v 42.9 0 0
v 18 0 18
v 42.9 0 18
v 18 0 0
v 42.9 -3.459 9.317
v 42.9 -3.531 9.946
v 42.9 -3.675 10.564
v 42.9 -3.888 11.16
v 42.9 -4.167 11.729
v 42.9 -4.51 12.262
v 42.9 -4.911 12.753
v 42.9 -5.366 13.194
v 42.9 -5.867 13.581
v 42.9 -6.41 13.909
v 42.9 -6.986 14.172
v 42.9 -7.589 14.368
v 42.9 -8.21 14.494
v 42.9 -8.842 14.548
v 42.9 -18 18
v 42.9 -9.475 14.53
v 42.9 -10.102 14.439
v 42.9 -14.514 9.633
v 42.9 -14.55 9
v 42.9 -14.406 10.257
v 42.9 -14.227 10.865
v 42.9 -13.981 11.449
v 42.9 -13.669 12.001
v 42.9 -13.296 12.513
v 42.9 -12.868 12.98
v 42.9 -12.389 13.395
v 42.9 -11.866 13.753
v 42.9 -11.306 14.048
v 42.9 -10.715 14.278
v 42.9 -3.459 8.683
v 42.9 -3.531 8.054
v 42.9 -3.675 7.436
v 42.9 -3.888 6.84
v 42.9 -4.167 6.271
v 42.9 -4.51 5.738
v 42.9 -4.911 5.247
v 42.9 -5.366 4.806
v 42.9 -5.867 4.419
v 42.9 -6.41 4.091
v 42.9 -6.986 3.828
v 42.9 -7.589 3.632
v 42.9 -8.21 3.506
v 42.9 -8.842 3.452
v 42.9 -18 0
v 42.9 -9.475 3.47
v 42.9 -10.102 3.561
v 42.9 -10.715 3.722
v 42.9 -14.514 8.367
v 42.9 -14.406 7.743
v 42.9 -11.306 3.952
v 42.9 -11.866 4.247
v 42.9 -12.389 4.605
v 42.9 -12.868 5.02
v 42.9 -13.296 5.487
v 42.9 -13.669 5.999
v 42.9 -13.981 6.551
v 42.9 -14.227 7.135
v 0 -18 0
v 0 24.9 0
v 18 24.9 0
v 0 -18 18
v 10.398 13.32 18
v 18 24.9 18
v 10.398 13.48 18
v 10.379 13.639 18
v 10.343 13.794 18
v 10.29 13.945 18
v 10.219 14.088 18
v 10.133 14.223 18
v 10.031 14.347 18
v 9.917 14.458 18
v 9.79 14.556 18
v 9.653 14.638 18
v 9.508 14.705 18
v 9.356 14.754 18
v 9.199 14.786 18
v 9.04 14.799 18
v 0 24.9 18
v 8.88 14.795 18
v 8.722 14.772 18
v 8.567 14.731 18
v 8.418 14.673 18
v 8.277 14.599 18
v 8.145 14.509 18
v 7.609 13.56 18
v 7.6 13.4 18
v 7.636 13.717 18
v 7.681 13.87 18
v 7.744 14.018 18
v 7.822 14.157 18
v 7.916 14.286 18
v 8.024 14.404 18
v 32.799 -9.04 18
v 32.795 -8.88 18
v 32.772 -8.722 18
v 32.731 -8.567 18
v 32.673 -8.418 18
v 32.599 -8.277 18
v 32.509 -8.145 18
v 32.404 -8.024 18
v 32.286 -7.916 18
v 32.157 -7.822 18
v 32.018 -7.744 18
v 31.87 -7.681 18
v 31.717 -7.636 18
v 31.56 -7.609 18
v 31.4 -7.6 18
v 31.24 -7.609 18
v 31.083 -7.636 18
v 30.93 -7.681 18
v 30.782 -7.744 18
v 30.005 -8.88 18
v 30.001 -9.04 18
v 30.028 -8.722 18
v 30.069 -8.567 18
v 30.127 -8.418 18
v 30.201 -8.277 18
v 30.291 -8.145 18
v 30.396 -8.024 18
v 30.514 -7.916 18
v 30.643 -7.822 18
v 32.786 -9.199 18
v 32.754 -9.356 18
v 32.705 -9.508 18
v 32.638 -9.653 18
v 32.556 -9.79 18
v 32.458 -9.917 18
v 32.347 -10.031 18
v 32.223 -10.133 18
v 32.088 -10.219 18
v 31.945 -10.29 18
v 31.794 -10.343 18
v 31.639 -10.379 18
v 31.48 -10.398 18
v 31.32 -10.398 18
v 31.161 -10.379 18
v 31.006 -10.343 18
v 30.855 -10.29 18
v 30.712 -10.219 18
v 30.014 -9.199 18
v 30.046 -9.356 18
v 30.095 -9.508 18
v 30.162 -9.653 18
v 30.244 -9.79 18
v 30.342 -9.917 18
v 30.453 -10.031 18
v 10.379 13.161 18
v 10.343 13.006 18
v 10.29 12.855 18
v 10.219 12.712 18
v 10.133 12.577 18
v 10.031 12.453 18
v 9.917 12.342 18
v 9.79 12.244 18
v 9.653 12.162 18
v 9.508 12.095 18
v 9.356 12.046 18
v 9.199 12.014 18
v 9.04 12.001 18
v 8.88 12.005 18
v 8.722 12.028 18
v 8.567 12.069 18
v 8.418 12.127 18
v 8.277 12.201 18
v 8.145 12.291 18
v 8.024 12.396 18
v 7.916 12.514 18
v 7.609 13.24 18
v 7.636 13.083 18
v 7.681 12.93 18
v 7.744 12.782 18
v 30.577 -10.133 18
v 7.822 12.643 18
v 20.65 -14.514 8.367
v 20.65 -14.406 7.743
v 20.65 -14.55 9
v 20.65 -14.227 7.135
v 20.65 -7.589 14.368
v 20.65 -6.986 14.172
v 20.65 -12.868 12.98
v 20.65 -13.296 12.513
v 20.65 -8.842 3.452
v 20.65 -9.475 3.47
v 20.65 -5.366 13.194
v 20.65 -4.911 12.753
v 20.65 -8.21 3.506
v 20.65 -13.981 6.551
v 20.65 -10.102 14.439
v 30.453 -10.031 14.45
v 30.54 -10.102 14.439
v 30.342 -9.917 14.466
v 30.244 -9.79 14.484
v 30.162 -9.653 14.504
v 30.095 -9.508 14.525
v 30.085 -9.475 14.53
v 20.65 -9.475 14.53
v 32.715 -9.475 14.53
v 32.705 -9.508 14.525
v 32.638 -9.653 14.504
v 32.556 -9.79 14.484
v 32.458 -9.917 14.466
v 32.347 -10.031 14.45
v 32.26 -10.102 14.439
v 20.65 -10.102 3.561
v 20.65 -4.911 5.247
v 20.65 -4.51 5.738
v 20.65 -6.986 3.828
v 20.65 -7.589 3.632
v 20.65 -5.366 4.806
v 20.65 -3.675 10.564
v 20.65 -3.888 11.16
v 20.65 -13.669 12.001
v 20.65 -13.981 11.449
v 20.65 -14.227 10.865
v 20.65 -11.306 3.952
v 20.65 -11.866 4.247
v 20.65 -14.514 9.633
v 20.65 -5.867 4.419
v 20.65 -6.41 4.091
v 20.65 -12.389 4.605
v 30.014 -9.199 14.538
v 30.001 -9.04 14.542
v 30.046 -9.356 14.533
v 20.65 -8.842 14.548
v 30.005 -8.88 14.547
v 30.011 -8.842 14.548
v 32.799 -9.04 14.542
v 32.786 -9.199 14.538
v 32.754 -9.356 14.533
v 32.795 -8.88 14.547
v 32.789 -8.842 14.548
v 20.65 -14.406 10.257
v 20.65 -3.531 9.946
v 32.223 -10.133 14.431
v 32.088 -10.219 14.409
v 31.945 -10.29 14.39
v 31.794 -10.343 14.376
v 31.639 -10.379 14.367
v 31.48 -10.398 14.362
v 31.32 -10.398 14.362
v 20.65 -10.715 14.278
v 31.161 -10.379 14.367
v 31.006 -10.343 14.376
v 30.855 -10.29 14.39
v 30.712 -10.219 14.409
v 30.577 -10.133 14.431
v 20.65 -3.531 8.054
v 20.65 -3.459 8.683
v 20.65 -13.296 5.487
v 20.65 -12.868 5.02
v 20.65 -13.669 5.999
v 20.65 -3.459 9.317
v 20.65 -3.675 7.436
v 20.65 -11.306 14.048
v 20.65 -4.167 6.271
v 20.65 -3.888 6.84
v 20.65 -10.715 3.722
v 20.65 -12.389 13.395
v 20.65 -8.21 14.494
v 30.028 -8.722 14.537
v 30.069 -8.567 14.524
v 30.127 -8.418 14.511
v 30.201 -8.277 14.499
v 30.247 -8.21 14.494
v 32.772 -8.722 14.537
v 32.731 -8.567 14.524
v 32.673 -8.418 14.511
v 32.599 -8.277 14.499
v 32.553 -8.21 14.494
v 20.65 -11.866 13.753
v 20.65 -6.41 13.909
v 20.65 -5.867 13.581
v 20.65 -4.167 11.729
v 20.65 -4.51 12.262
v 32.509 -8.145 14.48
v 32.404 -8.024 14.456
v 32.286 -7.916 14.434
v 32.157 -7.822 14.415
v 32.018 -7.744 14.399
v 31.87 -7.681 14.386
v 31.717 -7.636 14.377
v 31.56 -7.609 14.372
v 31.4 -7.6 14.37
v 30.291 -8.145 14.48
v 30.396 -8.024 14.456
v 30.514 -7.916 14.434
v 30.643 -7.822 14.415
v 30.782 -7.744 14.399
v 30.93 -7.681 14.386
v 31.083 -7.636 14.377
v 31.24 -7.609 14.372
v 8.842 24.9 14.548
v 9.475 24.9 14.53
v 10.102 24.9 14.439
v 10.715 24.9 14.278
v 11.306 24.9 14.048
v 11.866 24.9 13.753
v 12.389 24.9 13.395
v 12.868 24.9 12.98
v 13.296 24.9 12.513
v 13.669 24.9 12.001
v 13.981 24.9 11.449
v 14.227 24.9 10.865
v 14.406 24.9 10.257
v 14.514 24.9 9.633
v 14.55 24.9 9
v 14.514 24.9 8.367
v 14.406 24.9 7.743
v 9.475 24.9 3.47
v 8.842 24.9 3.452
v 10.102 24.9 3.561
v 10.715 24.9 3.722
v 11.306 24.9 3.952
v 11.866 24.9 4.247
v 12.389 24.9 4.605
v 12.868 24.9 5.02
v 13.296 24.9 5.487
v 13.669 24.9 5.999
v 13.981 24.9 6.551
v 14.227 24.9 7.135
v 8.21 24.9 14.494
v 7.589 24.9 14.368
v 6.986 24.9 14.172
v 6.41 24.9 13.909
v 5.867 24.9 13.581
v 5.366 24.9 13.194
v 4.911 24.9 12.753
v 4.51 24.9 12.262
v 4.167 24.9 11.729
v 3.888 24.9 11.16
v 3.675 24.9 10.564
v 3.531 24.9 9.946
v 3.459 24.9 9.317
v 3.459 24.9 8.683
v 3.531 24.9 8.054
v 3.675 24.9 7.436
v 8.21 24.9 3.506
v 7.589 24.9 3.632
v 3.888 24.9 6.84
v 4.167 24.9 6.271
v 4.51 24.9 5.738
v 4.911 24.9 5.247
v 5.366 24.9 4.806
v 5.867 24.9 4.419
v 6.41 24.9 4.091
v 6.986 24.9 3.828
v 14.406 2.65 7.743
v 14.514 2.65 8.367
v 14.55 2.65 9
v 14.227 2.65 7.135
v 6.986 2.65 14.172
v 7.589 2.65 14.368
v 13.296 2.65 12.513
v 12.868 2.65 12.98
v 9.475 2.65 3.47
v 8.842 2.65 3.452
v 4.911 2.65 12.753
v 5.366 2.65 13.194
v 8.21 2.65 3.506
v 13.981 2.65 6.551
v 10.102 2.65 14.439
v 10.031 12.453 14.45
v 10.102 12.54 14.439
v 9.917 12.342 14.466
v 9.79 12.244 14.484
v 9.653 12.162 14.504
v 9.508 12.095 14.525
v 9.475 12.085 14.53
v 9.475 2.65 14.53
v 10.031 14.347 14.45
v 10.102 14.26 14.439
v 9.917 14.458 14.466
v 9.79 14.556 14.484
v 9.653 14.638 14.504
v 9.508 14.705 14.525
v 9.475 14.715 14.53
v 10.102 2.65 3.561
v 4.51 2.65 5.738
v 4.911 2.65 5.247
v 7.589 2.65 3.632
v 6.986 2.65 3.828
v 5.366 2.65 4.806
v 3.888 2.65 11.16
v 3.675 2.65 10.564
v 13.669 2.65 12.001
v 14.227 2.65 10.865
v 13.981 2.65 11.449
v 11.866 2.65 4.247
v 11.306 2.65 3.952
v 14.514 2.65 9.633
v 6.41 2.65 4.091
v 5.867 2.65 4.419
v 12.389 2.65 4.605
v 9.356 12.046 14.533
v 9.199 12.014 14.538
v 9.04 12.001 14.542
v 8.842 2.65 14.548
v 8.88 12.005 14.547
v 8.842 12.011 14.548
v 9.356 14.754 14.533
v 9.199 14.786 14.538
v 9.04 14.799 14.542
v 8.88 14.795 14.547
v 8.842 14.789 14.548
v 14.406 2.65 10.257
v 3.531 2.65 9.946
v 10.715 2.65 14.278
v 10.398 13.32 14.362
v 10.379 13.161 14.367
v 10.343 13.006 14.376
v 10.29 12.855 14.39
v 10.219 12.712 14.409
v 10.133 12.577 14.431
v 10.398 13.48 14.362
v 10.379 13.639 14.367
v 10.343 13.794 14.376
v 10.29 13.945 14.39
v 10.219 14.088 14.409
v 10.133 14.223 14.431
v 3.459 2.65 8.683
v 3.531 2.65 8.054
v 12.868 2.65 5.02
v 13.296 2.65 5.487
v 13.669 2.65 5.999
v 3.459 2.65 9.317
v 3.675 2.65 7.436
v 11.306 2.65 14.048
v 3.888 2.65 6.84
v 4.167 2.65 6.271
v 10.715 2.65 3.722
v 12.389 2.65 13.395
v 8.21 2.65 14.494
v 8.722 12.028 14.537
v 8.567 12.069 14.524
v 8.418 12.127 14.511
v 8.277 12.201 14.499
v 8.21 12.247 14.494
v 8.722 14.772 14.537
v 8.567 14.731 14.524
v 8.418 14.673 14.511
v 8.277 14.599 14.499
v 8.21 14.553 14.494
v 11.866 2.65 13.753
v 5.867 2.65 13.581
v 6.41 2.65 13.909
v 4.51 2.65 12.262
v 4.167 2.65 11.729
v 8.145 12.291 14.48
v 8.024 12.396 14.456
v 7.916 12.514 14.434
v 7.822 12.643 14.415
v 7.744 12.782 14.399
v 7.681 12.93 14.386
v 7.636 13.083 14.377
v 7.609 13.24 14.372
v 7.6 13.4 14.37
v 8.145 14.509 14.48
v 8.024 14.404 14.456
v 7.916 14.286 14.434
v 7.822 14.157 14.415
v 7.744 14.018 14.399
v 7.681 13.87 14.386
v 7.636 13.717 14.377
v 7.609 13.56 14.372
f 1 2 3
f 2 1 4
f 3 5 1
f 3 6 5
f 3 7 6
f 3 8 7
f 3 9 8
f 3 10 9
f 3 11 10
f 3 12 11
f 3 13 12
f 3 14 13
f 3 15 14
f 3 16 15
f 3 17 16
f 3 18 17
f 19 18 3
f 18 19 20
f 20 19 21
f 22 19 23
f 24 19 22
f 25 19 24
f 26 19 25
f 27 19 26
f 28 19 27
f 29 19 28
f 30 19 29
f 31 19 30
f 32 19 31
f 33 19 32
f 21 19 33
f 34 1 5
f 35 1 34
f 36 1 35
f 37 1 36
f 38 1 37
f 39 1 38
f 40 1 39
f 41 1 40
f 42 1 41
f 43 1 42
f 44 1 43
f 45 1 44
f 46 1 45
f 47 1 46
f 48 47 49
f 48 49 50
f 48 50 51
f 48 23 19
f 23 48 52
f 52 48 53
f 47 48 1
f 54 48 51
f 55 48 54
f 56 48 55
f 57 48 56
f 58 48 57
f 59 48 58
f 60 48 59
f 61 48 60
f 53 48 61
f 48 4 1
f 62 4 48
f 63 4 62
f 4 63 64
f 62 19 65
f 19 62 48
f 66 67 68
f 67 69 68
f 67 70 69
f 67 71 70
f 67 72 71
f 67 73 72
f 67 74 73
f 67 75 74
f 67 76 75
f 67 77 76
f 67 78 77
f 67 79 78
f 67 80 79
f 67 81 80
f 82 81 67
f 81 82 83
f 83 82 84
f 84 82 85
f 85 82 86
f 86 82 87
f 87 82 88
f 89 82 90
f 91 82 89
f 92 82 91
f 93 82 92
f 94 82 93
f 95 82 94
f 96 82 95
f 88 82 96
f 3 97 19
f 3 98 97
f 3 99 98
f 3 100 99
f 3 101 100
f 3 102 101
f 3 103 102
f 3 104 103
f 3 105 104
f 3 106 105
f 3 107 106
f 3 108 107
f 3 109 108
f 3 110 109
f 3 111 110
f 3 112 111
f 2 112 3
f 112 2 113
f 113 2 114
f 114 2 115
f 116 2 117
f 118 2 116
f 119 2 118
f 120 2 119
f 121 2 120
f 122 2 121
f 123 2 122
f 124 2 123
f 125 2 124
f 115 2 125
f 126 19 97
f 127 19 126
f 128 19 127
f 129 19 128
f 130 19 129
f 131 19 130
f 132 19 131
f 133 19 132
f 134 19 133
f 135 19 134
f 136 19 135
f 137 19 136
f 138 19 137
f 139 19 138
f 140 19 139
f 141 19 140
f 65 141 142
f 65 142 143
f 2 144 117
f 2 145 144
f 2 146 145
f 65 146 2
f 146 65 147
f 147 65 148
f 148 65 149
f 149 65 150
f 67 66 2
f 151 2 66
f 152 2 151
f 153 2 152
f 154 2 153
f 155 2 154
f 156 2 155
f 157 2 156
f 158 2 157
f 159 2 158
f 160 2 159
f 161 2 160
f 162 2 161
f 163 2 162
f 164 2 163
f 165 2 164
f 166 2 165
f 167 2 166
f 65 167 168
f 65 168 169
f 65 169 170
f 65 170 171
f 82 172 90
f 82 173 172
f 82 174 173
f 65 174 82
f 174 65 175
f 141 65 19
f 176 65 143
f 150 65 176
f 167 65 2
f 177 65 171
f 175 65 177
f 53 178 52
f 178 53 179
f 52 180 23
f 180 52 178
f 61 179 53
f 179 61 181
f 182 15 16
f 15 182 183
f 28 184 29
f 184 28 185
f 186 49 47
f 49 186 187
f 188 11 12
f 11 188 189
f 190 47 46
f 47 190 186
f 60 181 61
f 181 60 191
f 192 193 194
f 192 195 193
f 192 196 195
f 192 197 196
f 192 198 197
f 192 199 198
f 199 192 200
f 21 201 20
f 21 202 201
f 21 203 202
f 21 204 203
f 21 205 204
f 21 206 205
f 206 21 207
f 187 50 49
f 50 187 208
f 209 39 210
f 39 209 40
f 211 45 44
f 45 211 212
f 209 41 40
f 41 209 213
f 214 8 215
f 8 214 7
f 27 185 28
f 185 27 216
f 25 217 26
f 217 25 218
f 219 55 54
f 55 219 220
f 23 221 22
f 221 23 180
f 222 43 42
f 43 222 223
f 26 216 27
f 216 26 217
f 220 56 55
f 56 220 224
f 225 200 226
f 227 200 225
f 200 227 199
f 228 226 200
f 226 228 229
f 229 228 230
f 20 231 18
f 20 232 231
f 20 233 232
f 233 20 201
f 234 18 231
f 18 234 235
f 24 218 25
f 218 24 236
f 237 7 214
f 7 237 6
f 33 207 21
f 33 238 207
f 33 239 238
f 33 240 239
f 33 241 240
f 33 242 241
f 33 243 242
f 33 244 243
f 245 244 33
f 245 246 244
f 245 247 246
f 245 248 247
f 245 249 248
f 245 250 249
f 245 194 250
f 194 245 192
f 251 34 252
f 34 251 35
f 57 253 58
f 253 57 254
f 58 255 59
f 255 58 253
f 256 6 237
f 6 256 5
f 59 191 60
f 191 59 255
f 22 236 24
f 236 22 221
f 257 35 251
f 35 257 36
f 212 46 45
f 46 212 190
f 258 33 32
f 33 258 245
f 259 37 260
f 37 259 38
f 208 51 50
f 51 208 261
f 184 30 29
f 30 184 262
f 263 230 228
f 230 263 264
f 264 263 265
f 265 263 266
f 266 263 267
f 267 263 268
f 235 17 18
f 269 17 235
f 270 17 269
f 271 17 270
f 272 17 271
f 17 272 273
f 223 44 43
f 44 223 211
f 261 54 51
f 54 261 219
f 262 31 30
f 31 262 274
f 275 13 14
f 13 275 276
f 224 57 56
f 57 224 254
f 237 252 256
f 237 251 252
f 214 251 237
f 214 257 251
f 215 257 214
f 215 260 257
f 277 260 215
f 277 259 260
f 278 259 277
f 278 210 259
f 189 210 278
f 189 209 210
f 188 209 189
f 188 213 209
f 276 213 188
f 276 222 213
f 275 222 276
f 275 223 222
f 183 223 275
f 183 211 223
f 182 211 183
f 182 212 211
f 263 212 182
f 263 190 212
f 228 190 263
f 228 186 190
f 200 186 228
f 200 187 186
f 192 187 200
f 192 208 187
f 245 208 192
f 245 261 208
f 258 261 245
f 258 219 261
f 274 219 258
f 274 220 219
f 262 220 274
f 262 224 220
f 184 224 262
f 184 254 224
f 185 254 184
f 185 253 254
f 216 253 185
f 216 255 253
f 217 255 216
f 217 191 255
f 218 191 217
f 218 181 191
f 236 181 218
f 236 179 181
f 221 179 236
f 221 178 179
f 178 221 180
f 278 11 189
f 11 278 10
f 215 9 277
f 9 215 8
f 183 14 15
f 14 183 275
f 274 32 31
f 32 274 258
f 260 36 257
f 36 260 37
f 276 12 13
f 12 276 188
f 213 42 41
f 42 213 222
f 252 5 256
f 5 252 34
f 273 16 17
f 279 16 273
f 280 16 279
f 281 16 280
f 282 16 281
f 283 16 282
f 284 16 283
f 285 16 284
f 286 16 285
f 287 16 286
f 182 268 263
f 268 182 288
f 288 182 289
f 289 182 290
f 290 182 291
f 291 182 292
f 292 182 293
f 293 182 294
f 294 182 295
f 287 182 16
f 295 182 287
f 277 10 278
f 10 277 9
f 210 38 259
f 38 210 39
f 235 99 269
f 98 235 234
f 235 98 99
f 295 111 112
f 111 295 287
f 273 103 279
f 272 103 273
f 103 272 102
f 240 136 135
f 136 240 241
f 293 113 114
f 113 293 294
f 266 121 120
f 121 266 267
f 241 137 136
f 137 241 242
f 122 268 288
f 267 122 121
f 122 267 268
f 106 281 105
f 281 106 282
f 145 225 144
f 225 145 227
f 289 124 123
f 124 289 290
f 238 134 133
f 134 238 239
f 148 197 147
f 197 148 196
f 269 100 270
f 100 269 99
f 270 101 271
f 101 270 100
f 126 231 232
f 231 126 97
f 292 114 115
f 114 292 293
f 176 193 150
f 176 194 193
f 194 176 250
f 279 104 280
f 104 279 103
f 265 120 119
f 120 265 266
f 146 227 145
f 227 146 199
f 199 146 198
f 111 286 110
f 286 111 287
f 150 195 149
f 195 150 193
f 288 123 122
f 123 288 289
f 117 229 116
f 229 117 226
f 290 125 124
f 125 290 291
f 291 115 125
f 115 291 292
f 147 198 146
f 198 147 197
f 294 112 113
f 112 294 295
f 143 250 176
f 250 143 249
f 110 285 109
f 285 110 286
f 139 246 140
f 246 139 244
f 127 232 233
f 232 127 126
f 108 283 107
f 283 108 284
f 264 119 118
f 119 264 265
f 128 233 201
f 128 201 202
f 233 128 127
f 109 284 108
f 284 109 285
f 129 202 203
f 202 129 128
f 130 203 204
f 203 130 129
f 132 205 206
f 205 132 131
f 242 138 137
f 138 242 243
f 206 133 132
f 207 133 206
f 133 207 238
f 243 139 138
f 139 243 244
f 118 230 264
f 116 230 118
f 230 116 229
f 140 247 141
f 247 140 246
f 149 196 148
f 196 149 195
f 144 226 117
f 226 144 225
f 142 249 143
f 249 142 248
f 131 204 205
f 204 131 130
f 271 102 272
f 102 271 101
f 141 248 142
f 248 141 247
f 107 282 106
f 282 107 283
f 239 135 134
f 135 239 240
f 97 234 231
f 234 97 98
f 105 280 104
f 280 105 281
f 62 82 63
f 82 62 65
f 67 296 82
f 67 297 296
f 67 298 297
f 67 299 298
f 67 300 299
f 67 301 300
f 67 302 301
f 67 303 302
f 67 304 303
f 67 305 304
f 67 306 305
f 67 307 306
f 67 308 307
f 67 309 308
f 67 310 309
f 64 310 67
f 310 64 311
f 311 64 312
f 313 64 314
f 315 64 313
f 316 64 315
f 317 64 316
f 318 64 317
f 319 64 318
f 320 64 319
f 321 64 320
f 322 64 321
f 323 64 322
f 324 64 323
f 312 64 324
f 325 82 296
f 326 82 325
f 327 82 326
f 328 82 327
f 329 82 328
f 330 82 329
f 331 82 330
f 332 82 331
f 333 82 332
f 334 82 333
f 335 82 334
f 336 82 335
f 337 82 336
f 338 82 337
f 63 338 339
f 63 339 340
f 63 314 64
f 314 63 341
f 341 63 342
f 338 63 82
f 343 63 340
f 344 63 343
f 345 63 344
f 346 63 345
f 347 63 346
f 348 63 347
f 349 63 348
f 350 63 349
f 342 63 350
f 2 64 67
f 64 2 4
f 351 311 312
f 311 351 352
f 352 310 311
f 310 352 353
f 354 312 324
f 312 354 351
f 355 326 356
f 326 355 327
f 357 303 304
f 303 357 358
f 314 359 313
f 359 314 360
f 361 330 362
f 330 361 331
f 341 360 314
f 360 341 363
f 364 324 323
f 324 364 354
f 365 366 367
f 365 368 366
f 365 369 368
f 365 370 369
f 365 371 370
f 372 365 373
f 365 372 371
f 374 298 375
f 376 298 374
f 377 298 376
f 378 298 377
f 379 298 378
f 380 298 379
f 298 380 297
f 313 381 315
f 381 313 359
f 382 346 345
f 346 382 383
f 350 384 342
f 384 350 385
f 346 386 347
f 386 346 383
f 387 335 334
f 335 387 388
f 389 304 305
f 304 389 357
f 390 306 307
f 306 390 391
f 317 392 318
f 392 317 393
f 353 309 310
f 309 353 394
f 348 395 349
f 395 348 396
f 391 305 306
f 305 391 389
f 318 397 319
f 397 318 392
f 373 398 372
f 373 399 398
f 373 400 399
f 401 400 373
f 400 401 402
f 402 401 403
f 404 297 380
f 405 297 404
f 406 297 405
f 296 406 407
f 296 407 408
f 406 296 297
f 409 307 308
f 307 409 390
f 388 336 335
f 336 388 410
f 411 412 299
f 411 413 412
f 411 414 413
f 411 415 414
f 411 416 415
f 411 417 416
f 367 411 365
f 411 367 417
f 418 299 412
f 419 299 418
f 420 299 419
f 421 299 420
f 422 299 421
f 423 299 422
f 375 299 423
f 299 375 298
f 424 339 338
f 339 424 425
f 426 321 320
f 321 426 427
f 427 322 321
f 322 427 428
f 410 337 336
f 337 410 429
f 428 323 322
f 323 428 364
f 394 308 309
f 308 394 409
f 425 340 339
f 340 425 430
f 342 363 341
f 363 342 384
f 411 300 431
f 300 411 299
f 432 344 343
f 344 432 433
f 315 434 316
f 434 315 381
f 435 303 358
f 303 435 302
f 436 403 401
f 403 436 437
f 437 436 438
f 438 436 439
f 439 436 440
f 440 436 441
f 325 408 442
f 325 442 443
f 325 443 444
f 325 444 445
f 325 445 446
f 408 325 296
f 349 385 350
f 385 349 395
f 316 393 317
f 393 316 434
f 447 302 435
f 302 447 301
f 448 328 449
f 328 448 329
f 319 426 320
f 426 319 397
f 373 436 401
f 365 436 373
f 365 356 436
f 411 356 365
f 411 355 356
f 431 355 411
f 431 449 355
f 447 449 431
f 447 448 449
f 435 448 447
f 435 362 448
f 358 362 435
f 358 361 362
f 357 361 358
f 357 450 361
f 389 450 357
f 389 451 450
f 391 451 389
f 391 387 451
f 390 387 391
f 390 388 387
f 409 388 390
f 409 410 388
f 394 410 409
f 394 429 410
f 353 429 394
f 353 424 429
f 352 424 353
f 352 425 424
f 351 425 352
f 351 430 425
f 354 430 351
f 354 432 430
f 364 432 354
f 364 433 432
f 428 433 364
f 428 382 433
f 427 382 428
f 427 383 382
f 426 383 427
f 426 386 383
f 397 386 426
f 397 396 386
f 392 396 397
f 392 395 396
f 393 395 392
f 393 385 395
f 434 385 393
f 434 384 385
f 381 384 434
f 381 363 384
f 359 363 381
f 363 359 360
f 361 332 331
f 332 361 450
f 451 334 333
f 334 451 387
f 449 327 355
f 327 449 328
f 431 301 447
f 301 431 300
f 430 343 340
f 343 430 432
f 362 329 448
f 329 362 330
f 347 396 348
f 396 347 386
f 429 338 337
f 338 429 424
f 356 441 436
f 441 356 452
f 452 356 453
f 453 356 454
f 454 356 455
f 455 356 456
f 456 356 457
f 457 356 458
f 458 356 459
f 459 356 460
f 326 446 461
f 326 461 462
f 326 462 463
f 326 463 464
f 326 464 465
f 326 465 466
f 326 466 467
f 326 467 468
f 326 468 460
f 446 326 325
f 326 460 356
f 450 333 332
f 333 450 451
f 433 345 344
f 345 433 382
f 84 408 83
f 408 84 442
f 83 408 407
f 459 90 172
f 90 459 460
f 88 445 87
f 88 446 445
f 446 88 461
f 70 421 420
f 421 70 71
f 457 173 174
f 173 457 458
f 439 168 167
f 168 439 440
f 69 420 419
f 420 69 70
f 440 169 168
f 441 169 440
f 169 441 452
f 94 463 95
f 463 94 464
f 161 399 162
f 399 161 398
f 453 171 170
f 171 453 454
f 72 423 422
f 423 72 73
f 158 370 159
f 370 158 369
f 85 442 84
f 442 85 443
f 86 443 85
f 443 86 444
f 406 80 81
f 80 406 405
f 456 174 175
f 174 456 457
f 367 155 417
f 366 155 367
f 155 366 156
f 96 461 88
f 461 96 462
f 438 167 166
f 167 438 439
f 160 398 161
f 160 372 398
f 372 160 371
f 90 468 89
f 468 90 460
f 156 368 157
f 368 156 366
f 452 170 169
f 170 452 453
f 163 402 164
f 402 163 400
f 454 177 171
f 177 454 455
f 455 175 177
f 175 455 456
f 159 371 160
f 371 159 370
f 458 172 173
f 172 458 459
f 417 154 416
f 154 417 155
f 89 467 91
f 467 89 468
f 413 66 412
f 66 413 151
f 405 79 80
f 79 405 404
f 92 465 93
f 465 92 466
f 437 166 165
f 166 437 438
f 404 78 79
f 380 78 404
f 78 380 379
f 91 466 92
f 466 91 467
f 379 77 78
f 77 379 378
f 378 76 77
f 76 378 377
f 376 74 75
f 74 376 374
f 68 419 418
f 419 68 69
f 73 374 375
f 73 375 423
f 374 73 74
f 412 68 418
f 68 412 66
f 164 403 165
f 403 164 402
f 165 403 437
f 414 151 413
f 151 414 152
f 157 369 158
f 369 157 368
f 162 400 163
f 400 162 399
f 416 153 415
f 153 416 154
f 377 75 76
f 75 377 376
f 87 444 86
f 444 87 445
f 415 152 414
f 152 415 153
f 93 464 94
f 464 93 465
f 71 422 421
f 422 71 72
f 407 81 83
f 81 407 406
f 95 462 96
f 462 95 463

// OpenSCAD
//cross-section size of coupler
cross_section = 18;
//length of each spoke of the coupler
coupler_length = 25;
//diameter of the tube hole
pipe_diameter = 11.1;
//diameter of the screw hole, 0 for none
screw_diameter = 2.8;
//type of coupler to make
coupler_type = 2;//[1: Straight, 2: L-coupler, 3: T-coupler, 4: Cross coupler]
//resolution (Segments per circle)
$fn=55;
module base_shape() {
    translate([0, 0, -0.1])//may be unnecessary - ensure no gaps in shape
    difference()
    {
        linear_extrude(height = coupler_length)
            square(cross_section);
        translate ([cross_section / 2, cross_section / 2, coupler_length * 0.11])
            cylinder(d = pipe_diameter, h= (coupler_length * 0.90));
        screw_hole();
    };
}

module screw_hole() {
    translate([cross_section / 2, cross_section / 2, cross_section * 0.75])
        rotate([-90, 0, 180])
            cylinder(d = screw_diameter, h = cross_section);
}

module straight_coupler() {
    union() {
        translate([cross_section, 0, cross_section])
        rotate([90, 180, 0])
                base_shape();
        translate([0, 0, cross_section])
            rotate([-90, 0, 0])
            base_shape();
    }
}

module l_coupler() {
       union() {
        translate([cross_section, 0, cross_section])
        rotate([90, 180, 90])
                base_shape();
        translate([0, 0, cross_section])
            rotate([-90, 0, 0])
            base_shape();
        translate([0, -cross_section, 0])
           cube(cross_section);
    } 
}

module t_coupler() {
    union () {
        straight_coupler();
        translate([0, -cross_section / 2, cross_section])
            rotate([-90, 0, 90])
            base_shape();
    }
}

module x_coupler() {
        union () {
        t_coupler();
        translate([cross_section, cross_section / 2, cross_section])
            rotate([-90, 0, -90])
            base_shape();
    }
}

if (coupler_type == 1) {
    straight_coupler();
} else if (coupler_type == 2) {
    l_coupler();
} else if (coupler_type == 3) {
    t_coupler();
} else if (coupler_type == 4) {
    x_coupler();
} else {
    echo("Invalid coupler type selected!");
}
